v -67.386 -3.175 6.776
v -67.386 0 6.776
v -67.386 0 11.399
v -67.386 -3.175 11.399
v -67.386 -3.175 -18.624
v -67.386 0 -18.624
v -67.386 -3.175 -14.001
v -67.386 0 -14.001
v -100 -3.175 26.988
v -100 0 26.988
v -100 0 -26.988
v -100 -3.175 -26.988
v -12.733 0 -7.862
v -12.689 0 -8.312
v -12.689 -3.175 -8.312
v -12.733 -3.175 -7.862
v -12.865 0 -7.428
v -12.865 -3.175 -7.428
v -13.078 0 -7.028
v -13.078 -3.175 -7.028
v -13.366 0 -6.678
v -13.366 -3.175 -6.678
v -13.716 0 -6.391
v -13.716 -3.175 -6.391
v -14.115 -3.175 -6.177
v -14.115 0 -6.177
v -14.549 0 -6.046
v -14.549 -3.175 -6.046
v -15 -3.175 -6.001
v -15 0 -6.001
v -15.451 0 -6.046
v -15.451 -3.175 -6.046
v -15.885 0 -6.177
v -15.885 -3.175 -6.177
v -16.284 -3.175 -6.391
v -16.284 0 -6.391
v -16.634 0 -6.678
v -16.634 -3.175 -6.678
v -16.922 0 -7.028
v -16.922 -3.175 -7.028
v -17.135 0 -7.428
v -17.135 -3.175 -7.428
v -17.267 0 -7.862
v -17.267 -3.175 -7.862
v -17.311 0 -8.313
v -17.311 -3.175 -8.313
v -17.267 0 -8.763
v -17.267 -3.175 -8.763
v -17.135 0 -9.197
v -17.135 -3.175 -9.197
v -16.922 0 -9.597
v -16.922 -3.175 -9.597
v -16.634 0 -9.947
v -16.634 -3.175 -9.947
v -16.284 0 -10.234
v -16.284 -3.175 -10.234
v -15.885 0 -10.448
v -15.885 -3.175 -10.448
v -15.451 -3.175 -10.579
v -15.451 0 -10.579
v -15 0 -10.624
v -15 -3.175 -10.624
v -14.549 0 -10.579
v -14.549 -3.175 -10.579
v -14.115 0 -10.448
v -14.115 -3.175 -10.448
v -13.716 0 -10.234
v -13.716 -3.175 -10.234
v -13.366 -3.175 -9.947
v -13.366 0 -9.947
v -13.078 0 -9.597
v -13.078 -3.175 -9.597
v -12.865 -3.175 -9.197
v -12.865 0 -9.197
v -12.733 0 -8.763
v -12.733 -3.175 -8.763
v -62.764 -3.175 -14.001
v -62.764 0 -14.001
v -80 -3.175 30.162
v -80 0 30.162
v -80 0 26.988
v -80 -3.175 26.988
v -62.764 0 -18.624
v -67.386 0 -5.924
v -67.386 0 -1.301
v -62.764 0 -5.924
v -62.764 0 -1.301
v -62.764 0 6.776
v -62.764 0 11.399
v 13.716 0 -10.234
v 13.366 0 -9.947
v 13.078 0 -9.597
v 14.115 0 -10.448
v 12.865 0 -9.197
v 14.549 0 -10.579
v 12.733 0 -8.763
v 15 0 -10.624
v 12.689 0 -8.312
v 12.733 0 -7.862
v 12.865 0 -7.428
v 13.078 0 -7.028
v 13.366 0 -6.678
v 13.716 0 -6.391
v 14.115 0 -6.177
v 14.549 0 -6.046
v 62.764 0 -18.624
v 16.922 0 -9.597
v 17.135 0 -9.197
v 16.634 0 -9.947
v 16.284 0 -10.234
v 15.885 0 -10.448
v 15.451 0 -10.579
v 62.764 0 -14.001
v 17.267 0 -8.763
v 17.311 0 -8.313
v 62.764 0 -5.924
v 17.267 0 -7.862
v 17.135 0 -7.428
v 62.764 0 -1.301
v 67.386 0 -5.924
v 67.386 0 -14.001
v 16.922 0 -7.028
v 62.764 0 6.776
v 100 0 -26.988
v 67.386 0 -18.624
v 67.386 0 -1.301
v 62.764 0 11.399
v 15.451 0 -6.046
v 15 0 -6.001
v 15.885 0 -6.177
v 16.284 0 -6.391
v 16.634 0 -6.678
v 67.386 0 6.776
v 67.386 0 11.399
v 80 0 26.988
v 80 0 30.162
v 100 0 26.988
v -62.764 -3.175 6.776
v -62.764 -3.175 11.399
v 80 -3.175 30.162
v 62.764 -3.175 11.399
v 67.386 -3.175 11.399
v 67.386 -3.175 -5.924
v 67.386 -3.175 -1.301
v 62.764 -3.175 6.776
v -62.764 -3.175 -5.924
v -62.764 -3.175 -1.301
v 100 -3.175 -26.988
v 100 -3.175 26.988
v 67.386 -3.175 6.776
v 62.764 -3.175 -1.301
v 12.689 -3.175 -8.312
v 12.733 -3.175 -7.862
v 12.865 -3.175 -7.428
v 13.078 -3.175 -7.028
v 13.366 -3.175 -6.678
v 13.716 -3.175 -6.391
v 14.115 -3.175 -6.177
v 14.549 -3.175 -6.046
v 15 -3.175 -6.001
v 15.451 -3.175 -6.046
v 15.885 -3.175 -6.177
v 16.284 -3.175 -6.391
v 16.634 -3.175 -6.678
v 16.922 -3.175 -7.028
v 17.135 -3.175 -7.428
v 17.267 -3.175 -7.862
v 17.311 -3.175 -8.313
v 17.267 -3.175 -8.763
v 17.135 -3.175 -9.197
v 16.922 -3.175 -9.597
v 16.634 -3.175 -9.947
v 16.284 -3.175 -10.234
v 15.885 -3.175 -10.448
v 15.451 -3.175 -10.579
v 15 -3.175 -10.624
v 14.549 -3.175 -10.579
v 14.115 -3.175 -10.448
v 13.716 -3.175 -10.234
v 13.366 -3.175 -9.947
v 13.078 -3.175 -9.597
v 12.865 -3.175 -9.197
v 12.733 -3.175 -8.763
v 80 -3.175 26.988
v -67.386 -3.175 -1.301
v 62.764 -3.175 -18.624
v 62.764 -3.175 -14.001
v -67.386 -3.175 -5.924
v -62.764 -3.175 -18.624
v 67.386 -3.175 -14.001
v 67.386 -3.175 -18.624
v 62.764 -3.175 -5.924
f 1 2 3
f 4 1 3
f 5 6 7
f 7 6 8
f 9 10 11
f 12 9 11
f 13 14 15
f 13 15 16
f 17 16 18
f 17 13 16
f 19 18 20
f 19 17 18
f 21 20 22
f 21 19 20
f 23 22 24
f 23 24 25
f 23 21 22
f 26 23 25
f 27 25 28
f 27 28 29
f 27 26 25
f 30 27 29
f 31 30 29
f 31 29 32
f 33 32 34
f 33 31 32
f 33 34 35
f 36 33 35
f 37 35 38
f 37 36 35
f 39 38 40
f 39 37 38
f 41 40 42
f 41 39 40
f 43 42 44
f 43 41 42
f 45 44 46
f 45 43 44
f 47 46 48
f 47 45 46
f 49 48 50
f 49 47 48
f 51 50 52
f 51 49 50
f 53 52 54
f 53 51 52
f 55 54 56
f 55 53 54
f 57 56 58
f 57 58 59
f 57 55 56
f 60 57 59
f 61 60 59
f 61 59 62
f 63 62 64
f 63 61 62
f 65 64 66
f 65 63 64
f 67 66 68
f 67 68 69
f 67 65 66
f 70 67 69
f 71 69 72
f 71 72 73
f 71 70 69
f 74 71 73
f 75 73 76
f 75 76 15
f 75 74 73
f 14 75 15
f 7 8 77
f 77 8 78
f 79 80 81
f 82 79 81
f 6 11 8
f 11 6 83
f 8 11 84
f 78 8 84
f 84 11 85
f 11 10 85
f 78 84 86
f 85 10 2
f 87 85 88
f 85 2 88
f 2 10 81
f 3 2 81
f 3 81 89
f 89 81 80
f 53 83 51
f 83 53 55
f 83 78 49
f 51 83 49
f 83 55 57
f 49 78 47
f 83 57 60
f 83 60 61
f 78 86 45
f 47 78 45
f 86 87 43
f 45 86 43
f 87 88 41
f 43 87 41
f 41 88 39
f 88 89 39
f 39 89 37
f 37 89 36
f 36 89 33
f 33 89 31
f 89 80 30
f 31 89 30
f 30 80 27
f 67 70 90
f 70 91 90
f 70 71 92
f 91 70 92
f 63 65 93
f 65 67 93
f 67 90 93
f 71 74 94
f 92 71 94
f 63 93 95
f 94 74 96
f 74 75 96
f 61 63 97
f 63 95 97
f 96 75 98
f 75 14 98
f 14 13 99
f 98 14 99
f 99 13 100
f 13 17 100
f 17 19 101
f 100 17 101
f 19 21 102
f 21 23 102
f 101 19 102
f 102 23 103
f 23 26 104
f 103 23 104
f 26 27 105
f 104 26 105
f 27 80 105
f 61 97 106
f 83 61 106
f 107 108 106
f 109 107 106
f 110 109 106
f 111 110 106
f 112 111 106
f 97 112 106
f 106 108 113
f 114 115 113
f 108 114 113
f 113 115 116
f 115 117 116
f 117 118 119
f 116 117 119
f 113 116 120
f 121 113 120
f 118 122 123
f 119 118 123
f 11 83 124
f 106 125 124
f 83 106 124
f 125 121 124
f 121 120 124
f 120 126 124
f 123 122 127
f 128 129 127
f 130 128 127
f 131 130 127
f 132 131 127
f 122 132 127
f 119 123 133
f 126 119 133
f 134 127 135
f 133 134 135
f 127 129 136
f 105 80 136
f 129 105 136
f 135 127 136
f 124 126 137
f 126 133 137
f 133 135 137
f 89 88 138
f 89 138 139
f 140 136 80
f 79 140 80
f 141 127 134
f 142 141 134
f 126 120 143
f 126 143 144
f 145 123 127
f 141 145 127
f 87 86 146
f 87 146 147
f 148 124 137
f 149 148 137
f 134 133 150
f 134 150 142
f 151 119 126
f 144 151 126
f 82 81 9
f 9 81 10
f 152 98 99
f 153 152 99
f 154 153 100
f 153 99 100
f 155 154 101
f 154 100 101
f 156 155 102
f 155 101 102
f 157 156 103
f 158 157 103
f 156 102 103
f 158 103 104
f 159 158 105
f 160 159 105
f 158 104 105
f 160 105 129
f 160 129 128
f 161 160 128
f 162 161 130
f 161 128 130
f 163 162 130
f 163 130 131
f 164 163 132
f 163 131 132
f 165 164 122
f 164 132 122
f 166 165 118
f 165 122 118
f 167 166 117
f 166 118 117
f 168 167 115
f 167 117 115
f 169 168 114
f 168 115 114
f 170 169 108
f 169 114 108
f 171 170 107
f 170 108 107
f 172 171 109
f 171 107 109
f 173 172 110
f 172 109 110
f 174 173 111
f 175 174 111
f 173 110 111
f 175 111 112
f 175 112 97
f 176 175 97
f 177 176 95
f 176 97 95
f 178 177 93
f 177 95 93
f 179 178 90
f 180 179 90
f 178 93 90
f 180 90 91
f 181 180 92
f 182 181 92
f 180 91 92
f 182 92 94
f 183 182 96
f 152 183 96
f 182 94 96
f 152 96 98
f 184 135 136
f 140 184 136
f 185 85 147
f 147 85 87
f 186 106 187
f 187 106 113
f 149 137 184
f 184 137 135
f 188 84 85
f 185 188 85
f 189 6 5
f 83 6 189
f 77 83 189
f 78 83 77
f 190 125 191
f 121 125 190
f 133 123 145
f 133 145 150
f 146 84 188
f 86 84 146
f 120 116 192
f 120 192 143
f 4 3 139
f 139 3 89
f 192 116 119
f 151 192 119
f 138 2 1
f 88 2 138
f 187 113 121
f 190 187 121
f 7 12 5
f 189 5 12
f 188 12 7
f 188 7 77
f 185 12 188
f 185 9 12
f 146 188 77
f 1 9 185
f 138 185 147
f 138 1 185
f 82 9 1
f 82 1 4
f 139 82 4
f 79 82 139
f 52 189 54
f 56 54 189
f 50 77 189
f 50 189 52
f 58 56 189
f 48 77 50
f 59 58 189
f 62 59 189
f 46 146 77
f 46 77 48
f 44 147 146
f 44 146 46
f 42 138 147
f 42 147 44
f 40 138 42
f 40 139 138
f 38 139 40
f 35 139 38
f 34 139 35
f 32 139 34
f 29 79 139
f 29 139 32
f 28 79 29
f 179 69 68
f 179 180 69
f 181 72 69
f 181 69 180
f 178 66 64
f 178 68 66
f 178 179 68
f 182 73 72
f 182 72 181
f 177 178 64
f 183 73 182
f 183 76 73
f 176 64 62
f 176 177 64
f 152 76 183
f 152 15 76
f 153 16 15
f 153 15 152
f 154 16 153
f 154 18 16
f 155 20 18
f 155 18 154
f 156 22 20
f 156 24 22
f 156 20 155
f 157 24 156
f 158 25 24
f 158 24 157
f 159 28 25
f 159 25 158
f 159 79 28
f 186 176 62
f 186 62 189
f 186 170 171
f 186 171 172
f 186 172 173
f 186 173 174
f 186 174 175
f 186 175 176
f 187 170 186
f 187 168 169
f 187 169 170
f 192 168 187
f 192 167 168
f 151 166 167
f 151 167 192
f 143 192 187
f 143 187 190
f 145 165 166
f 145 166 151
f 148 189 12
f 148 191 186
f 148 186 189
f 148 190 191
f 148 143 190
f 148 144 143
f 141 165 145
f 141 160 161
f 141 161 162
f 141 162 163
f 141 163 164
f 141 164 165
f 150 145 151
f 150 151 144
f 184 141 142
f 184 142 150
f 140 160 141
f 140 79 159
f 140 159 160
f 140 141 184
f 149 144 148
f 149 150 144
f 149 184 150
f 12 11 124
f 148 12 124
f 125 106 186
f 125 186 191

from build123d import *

# Parameters (mm, degrees)
F0_W     = 4.6228
F0_H     = 4.6228
F0_R     = 2.3114
F1_DEPTH = 3.175


with BuildPart() as f1:
    # F0 (on Front) → F1 (new body)
    with BuildSketch(Plane.XZ):
        with BuildLine():
            ThreePointArc((17.3114, -8.3125), (15, -6.0011), (12.6886, -8.3125))
            ThreePointArc((12.6886, -8.3125), (15, -10.6239), (17.3114, -8.3125))
        make_face()
        Polygon((100, -26.9875), (100, 26.9875), (80, 26.9875), (80, 30.1625), (0, 30.1625), (0, -8.3125), (0, -26.9875), align=None)
        with Locations((65.075, -16.3125)):
            Rectangle(F0_W, F0_H, mode=Mode.SUBTRACT)
        with BuildLine():
            ThreePointArc((17.3114, -8.3125), (15, -10.6239), (12.6886, -8.3125))
            ThreePointArc((12.6886, -8.3125), (15, -6.0011), (17.3114, -8.3125))
        make_face(mode=Mode.SUBTRACT)
        with Locations((65.075, -3.6125)):
            Rectangle(F0_W, F0_H, mode=Mode.SUBTRACT)
        with Locations((65.075, 9.0875)):
            Rectangle(F0_W, F0_H, mode=Mode.SUBTRACT)
        Polygon((-65.075, -26.9875), (0, -26.9875), (0, -8.3125), (0, 30.1625), (-80, 30.1625), (-80, 26.9875), (-100, 26.9875), (-100, -26.9875), align=None)
        with Locations((-65.075, -16.3125)):
            Rectangle(F0_W, F0_H, mode=Mode.SUBTRACT)
        with Locations((-65.075, -3.6125)):
            Rectangle(F0_W, F0_H, mode=Mode.SUBTRACT)
        with Locations((-15, -8.3125)):
            Circle(F0_R, mode=Mode.SUBTRACT)
        with Locations((-65.075, 9.0875)):
            Rectangle(F0_W, F0_H, mode=Mode.SUBTRACT)
    extrude(amount=F1_DEPTH)


solid = f1.part
